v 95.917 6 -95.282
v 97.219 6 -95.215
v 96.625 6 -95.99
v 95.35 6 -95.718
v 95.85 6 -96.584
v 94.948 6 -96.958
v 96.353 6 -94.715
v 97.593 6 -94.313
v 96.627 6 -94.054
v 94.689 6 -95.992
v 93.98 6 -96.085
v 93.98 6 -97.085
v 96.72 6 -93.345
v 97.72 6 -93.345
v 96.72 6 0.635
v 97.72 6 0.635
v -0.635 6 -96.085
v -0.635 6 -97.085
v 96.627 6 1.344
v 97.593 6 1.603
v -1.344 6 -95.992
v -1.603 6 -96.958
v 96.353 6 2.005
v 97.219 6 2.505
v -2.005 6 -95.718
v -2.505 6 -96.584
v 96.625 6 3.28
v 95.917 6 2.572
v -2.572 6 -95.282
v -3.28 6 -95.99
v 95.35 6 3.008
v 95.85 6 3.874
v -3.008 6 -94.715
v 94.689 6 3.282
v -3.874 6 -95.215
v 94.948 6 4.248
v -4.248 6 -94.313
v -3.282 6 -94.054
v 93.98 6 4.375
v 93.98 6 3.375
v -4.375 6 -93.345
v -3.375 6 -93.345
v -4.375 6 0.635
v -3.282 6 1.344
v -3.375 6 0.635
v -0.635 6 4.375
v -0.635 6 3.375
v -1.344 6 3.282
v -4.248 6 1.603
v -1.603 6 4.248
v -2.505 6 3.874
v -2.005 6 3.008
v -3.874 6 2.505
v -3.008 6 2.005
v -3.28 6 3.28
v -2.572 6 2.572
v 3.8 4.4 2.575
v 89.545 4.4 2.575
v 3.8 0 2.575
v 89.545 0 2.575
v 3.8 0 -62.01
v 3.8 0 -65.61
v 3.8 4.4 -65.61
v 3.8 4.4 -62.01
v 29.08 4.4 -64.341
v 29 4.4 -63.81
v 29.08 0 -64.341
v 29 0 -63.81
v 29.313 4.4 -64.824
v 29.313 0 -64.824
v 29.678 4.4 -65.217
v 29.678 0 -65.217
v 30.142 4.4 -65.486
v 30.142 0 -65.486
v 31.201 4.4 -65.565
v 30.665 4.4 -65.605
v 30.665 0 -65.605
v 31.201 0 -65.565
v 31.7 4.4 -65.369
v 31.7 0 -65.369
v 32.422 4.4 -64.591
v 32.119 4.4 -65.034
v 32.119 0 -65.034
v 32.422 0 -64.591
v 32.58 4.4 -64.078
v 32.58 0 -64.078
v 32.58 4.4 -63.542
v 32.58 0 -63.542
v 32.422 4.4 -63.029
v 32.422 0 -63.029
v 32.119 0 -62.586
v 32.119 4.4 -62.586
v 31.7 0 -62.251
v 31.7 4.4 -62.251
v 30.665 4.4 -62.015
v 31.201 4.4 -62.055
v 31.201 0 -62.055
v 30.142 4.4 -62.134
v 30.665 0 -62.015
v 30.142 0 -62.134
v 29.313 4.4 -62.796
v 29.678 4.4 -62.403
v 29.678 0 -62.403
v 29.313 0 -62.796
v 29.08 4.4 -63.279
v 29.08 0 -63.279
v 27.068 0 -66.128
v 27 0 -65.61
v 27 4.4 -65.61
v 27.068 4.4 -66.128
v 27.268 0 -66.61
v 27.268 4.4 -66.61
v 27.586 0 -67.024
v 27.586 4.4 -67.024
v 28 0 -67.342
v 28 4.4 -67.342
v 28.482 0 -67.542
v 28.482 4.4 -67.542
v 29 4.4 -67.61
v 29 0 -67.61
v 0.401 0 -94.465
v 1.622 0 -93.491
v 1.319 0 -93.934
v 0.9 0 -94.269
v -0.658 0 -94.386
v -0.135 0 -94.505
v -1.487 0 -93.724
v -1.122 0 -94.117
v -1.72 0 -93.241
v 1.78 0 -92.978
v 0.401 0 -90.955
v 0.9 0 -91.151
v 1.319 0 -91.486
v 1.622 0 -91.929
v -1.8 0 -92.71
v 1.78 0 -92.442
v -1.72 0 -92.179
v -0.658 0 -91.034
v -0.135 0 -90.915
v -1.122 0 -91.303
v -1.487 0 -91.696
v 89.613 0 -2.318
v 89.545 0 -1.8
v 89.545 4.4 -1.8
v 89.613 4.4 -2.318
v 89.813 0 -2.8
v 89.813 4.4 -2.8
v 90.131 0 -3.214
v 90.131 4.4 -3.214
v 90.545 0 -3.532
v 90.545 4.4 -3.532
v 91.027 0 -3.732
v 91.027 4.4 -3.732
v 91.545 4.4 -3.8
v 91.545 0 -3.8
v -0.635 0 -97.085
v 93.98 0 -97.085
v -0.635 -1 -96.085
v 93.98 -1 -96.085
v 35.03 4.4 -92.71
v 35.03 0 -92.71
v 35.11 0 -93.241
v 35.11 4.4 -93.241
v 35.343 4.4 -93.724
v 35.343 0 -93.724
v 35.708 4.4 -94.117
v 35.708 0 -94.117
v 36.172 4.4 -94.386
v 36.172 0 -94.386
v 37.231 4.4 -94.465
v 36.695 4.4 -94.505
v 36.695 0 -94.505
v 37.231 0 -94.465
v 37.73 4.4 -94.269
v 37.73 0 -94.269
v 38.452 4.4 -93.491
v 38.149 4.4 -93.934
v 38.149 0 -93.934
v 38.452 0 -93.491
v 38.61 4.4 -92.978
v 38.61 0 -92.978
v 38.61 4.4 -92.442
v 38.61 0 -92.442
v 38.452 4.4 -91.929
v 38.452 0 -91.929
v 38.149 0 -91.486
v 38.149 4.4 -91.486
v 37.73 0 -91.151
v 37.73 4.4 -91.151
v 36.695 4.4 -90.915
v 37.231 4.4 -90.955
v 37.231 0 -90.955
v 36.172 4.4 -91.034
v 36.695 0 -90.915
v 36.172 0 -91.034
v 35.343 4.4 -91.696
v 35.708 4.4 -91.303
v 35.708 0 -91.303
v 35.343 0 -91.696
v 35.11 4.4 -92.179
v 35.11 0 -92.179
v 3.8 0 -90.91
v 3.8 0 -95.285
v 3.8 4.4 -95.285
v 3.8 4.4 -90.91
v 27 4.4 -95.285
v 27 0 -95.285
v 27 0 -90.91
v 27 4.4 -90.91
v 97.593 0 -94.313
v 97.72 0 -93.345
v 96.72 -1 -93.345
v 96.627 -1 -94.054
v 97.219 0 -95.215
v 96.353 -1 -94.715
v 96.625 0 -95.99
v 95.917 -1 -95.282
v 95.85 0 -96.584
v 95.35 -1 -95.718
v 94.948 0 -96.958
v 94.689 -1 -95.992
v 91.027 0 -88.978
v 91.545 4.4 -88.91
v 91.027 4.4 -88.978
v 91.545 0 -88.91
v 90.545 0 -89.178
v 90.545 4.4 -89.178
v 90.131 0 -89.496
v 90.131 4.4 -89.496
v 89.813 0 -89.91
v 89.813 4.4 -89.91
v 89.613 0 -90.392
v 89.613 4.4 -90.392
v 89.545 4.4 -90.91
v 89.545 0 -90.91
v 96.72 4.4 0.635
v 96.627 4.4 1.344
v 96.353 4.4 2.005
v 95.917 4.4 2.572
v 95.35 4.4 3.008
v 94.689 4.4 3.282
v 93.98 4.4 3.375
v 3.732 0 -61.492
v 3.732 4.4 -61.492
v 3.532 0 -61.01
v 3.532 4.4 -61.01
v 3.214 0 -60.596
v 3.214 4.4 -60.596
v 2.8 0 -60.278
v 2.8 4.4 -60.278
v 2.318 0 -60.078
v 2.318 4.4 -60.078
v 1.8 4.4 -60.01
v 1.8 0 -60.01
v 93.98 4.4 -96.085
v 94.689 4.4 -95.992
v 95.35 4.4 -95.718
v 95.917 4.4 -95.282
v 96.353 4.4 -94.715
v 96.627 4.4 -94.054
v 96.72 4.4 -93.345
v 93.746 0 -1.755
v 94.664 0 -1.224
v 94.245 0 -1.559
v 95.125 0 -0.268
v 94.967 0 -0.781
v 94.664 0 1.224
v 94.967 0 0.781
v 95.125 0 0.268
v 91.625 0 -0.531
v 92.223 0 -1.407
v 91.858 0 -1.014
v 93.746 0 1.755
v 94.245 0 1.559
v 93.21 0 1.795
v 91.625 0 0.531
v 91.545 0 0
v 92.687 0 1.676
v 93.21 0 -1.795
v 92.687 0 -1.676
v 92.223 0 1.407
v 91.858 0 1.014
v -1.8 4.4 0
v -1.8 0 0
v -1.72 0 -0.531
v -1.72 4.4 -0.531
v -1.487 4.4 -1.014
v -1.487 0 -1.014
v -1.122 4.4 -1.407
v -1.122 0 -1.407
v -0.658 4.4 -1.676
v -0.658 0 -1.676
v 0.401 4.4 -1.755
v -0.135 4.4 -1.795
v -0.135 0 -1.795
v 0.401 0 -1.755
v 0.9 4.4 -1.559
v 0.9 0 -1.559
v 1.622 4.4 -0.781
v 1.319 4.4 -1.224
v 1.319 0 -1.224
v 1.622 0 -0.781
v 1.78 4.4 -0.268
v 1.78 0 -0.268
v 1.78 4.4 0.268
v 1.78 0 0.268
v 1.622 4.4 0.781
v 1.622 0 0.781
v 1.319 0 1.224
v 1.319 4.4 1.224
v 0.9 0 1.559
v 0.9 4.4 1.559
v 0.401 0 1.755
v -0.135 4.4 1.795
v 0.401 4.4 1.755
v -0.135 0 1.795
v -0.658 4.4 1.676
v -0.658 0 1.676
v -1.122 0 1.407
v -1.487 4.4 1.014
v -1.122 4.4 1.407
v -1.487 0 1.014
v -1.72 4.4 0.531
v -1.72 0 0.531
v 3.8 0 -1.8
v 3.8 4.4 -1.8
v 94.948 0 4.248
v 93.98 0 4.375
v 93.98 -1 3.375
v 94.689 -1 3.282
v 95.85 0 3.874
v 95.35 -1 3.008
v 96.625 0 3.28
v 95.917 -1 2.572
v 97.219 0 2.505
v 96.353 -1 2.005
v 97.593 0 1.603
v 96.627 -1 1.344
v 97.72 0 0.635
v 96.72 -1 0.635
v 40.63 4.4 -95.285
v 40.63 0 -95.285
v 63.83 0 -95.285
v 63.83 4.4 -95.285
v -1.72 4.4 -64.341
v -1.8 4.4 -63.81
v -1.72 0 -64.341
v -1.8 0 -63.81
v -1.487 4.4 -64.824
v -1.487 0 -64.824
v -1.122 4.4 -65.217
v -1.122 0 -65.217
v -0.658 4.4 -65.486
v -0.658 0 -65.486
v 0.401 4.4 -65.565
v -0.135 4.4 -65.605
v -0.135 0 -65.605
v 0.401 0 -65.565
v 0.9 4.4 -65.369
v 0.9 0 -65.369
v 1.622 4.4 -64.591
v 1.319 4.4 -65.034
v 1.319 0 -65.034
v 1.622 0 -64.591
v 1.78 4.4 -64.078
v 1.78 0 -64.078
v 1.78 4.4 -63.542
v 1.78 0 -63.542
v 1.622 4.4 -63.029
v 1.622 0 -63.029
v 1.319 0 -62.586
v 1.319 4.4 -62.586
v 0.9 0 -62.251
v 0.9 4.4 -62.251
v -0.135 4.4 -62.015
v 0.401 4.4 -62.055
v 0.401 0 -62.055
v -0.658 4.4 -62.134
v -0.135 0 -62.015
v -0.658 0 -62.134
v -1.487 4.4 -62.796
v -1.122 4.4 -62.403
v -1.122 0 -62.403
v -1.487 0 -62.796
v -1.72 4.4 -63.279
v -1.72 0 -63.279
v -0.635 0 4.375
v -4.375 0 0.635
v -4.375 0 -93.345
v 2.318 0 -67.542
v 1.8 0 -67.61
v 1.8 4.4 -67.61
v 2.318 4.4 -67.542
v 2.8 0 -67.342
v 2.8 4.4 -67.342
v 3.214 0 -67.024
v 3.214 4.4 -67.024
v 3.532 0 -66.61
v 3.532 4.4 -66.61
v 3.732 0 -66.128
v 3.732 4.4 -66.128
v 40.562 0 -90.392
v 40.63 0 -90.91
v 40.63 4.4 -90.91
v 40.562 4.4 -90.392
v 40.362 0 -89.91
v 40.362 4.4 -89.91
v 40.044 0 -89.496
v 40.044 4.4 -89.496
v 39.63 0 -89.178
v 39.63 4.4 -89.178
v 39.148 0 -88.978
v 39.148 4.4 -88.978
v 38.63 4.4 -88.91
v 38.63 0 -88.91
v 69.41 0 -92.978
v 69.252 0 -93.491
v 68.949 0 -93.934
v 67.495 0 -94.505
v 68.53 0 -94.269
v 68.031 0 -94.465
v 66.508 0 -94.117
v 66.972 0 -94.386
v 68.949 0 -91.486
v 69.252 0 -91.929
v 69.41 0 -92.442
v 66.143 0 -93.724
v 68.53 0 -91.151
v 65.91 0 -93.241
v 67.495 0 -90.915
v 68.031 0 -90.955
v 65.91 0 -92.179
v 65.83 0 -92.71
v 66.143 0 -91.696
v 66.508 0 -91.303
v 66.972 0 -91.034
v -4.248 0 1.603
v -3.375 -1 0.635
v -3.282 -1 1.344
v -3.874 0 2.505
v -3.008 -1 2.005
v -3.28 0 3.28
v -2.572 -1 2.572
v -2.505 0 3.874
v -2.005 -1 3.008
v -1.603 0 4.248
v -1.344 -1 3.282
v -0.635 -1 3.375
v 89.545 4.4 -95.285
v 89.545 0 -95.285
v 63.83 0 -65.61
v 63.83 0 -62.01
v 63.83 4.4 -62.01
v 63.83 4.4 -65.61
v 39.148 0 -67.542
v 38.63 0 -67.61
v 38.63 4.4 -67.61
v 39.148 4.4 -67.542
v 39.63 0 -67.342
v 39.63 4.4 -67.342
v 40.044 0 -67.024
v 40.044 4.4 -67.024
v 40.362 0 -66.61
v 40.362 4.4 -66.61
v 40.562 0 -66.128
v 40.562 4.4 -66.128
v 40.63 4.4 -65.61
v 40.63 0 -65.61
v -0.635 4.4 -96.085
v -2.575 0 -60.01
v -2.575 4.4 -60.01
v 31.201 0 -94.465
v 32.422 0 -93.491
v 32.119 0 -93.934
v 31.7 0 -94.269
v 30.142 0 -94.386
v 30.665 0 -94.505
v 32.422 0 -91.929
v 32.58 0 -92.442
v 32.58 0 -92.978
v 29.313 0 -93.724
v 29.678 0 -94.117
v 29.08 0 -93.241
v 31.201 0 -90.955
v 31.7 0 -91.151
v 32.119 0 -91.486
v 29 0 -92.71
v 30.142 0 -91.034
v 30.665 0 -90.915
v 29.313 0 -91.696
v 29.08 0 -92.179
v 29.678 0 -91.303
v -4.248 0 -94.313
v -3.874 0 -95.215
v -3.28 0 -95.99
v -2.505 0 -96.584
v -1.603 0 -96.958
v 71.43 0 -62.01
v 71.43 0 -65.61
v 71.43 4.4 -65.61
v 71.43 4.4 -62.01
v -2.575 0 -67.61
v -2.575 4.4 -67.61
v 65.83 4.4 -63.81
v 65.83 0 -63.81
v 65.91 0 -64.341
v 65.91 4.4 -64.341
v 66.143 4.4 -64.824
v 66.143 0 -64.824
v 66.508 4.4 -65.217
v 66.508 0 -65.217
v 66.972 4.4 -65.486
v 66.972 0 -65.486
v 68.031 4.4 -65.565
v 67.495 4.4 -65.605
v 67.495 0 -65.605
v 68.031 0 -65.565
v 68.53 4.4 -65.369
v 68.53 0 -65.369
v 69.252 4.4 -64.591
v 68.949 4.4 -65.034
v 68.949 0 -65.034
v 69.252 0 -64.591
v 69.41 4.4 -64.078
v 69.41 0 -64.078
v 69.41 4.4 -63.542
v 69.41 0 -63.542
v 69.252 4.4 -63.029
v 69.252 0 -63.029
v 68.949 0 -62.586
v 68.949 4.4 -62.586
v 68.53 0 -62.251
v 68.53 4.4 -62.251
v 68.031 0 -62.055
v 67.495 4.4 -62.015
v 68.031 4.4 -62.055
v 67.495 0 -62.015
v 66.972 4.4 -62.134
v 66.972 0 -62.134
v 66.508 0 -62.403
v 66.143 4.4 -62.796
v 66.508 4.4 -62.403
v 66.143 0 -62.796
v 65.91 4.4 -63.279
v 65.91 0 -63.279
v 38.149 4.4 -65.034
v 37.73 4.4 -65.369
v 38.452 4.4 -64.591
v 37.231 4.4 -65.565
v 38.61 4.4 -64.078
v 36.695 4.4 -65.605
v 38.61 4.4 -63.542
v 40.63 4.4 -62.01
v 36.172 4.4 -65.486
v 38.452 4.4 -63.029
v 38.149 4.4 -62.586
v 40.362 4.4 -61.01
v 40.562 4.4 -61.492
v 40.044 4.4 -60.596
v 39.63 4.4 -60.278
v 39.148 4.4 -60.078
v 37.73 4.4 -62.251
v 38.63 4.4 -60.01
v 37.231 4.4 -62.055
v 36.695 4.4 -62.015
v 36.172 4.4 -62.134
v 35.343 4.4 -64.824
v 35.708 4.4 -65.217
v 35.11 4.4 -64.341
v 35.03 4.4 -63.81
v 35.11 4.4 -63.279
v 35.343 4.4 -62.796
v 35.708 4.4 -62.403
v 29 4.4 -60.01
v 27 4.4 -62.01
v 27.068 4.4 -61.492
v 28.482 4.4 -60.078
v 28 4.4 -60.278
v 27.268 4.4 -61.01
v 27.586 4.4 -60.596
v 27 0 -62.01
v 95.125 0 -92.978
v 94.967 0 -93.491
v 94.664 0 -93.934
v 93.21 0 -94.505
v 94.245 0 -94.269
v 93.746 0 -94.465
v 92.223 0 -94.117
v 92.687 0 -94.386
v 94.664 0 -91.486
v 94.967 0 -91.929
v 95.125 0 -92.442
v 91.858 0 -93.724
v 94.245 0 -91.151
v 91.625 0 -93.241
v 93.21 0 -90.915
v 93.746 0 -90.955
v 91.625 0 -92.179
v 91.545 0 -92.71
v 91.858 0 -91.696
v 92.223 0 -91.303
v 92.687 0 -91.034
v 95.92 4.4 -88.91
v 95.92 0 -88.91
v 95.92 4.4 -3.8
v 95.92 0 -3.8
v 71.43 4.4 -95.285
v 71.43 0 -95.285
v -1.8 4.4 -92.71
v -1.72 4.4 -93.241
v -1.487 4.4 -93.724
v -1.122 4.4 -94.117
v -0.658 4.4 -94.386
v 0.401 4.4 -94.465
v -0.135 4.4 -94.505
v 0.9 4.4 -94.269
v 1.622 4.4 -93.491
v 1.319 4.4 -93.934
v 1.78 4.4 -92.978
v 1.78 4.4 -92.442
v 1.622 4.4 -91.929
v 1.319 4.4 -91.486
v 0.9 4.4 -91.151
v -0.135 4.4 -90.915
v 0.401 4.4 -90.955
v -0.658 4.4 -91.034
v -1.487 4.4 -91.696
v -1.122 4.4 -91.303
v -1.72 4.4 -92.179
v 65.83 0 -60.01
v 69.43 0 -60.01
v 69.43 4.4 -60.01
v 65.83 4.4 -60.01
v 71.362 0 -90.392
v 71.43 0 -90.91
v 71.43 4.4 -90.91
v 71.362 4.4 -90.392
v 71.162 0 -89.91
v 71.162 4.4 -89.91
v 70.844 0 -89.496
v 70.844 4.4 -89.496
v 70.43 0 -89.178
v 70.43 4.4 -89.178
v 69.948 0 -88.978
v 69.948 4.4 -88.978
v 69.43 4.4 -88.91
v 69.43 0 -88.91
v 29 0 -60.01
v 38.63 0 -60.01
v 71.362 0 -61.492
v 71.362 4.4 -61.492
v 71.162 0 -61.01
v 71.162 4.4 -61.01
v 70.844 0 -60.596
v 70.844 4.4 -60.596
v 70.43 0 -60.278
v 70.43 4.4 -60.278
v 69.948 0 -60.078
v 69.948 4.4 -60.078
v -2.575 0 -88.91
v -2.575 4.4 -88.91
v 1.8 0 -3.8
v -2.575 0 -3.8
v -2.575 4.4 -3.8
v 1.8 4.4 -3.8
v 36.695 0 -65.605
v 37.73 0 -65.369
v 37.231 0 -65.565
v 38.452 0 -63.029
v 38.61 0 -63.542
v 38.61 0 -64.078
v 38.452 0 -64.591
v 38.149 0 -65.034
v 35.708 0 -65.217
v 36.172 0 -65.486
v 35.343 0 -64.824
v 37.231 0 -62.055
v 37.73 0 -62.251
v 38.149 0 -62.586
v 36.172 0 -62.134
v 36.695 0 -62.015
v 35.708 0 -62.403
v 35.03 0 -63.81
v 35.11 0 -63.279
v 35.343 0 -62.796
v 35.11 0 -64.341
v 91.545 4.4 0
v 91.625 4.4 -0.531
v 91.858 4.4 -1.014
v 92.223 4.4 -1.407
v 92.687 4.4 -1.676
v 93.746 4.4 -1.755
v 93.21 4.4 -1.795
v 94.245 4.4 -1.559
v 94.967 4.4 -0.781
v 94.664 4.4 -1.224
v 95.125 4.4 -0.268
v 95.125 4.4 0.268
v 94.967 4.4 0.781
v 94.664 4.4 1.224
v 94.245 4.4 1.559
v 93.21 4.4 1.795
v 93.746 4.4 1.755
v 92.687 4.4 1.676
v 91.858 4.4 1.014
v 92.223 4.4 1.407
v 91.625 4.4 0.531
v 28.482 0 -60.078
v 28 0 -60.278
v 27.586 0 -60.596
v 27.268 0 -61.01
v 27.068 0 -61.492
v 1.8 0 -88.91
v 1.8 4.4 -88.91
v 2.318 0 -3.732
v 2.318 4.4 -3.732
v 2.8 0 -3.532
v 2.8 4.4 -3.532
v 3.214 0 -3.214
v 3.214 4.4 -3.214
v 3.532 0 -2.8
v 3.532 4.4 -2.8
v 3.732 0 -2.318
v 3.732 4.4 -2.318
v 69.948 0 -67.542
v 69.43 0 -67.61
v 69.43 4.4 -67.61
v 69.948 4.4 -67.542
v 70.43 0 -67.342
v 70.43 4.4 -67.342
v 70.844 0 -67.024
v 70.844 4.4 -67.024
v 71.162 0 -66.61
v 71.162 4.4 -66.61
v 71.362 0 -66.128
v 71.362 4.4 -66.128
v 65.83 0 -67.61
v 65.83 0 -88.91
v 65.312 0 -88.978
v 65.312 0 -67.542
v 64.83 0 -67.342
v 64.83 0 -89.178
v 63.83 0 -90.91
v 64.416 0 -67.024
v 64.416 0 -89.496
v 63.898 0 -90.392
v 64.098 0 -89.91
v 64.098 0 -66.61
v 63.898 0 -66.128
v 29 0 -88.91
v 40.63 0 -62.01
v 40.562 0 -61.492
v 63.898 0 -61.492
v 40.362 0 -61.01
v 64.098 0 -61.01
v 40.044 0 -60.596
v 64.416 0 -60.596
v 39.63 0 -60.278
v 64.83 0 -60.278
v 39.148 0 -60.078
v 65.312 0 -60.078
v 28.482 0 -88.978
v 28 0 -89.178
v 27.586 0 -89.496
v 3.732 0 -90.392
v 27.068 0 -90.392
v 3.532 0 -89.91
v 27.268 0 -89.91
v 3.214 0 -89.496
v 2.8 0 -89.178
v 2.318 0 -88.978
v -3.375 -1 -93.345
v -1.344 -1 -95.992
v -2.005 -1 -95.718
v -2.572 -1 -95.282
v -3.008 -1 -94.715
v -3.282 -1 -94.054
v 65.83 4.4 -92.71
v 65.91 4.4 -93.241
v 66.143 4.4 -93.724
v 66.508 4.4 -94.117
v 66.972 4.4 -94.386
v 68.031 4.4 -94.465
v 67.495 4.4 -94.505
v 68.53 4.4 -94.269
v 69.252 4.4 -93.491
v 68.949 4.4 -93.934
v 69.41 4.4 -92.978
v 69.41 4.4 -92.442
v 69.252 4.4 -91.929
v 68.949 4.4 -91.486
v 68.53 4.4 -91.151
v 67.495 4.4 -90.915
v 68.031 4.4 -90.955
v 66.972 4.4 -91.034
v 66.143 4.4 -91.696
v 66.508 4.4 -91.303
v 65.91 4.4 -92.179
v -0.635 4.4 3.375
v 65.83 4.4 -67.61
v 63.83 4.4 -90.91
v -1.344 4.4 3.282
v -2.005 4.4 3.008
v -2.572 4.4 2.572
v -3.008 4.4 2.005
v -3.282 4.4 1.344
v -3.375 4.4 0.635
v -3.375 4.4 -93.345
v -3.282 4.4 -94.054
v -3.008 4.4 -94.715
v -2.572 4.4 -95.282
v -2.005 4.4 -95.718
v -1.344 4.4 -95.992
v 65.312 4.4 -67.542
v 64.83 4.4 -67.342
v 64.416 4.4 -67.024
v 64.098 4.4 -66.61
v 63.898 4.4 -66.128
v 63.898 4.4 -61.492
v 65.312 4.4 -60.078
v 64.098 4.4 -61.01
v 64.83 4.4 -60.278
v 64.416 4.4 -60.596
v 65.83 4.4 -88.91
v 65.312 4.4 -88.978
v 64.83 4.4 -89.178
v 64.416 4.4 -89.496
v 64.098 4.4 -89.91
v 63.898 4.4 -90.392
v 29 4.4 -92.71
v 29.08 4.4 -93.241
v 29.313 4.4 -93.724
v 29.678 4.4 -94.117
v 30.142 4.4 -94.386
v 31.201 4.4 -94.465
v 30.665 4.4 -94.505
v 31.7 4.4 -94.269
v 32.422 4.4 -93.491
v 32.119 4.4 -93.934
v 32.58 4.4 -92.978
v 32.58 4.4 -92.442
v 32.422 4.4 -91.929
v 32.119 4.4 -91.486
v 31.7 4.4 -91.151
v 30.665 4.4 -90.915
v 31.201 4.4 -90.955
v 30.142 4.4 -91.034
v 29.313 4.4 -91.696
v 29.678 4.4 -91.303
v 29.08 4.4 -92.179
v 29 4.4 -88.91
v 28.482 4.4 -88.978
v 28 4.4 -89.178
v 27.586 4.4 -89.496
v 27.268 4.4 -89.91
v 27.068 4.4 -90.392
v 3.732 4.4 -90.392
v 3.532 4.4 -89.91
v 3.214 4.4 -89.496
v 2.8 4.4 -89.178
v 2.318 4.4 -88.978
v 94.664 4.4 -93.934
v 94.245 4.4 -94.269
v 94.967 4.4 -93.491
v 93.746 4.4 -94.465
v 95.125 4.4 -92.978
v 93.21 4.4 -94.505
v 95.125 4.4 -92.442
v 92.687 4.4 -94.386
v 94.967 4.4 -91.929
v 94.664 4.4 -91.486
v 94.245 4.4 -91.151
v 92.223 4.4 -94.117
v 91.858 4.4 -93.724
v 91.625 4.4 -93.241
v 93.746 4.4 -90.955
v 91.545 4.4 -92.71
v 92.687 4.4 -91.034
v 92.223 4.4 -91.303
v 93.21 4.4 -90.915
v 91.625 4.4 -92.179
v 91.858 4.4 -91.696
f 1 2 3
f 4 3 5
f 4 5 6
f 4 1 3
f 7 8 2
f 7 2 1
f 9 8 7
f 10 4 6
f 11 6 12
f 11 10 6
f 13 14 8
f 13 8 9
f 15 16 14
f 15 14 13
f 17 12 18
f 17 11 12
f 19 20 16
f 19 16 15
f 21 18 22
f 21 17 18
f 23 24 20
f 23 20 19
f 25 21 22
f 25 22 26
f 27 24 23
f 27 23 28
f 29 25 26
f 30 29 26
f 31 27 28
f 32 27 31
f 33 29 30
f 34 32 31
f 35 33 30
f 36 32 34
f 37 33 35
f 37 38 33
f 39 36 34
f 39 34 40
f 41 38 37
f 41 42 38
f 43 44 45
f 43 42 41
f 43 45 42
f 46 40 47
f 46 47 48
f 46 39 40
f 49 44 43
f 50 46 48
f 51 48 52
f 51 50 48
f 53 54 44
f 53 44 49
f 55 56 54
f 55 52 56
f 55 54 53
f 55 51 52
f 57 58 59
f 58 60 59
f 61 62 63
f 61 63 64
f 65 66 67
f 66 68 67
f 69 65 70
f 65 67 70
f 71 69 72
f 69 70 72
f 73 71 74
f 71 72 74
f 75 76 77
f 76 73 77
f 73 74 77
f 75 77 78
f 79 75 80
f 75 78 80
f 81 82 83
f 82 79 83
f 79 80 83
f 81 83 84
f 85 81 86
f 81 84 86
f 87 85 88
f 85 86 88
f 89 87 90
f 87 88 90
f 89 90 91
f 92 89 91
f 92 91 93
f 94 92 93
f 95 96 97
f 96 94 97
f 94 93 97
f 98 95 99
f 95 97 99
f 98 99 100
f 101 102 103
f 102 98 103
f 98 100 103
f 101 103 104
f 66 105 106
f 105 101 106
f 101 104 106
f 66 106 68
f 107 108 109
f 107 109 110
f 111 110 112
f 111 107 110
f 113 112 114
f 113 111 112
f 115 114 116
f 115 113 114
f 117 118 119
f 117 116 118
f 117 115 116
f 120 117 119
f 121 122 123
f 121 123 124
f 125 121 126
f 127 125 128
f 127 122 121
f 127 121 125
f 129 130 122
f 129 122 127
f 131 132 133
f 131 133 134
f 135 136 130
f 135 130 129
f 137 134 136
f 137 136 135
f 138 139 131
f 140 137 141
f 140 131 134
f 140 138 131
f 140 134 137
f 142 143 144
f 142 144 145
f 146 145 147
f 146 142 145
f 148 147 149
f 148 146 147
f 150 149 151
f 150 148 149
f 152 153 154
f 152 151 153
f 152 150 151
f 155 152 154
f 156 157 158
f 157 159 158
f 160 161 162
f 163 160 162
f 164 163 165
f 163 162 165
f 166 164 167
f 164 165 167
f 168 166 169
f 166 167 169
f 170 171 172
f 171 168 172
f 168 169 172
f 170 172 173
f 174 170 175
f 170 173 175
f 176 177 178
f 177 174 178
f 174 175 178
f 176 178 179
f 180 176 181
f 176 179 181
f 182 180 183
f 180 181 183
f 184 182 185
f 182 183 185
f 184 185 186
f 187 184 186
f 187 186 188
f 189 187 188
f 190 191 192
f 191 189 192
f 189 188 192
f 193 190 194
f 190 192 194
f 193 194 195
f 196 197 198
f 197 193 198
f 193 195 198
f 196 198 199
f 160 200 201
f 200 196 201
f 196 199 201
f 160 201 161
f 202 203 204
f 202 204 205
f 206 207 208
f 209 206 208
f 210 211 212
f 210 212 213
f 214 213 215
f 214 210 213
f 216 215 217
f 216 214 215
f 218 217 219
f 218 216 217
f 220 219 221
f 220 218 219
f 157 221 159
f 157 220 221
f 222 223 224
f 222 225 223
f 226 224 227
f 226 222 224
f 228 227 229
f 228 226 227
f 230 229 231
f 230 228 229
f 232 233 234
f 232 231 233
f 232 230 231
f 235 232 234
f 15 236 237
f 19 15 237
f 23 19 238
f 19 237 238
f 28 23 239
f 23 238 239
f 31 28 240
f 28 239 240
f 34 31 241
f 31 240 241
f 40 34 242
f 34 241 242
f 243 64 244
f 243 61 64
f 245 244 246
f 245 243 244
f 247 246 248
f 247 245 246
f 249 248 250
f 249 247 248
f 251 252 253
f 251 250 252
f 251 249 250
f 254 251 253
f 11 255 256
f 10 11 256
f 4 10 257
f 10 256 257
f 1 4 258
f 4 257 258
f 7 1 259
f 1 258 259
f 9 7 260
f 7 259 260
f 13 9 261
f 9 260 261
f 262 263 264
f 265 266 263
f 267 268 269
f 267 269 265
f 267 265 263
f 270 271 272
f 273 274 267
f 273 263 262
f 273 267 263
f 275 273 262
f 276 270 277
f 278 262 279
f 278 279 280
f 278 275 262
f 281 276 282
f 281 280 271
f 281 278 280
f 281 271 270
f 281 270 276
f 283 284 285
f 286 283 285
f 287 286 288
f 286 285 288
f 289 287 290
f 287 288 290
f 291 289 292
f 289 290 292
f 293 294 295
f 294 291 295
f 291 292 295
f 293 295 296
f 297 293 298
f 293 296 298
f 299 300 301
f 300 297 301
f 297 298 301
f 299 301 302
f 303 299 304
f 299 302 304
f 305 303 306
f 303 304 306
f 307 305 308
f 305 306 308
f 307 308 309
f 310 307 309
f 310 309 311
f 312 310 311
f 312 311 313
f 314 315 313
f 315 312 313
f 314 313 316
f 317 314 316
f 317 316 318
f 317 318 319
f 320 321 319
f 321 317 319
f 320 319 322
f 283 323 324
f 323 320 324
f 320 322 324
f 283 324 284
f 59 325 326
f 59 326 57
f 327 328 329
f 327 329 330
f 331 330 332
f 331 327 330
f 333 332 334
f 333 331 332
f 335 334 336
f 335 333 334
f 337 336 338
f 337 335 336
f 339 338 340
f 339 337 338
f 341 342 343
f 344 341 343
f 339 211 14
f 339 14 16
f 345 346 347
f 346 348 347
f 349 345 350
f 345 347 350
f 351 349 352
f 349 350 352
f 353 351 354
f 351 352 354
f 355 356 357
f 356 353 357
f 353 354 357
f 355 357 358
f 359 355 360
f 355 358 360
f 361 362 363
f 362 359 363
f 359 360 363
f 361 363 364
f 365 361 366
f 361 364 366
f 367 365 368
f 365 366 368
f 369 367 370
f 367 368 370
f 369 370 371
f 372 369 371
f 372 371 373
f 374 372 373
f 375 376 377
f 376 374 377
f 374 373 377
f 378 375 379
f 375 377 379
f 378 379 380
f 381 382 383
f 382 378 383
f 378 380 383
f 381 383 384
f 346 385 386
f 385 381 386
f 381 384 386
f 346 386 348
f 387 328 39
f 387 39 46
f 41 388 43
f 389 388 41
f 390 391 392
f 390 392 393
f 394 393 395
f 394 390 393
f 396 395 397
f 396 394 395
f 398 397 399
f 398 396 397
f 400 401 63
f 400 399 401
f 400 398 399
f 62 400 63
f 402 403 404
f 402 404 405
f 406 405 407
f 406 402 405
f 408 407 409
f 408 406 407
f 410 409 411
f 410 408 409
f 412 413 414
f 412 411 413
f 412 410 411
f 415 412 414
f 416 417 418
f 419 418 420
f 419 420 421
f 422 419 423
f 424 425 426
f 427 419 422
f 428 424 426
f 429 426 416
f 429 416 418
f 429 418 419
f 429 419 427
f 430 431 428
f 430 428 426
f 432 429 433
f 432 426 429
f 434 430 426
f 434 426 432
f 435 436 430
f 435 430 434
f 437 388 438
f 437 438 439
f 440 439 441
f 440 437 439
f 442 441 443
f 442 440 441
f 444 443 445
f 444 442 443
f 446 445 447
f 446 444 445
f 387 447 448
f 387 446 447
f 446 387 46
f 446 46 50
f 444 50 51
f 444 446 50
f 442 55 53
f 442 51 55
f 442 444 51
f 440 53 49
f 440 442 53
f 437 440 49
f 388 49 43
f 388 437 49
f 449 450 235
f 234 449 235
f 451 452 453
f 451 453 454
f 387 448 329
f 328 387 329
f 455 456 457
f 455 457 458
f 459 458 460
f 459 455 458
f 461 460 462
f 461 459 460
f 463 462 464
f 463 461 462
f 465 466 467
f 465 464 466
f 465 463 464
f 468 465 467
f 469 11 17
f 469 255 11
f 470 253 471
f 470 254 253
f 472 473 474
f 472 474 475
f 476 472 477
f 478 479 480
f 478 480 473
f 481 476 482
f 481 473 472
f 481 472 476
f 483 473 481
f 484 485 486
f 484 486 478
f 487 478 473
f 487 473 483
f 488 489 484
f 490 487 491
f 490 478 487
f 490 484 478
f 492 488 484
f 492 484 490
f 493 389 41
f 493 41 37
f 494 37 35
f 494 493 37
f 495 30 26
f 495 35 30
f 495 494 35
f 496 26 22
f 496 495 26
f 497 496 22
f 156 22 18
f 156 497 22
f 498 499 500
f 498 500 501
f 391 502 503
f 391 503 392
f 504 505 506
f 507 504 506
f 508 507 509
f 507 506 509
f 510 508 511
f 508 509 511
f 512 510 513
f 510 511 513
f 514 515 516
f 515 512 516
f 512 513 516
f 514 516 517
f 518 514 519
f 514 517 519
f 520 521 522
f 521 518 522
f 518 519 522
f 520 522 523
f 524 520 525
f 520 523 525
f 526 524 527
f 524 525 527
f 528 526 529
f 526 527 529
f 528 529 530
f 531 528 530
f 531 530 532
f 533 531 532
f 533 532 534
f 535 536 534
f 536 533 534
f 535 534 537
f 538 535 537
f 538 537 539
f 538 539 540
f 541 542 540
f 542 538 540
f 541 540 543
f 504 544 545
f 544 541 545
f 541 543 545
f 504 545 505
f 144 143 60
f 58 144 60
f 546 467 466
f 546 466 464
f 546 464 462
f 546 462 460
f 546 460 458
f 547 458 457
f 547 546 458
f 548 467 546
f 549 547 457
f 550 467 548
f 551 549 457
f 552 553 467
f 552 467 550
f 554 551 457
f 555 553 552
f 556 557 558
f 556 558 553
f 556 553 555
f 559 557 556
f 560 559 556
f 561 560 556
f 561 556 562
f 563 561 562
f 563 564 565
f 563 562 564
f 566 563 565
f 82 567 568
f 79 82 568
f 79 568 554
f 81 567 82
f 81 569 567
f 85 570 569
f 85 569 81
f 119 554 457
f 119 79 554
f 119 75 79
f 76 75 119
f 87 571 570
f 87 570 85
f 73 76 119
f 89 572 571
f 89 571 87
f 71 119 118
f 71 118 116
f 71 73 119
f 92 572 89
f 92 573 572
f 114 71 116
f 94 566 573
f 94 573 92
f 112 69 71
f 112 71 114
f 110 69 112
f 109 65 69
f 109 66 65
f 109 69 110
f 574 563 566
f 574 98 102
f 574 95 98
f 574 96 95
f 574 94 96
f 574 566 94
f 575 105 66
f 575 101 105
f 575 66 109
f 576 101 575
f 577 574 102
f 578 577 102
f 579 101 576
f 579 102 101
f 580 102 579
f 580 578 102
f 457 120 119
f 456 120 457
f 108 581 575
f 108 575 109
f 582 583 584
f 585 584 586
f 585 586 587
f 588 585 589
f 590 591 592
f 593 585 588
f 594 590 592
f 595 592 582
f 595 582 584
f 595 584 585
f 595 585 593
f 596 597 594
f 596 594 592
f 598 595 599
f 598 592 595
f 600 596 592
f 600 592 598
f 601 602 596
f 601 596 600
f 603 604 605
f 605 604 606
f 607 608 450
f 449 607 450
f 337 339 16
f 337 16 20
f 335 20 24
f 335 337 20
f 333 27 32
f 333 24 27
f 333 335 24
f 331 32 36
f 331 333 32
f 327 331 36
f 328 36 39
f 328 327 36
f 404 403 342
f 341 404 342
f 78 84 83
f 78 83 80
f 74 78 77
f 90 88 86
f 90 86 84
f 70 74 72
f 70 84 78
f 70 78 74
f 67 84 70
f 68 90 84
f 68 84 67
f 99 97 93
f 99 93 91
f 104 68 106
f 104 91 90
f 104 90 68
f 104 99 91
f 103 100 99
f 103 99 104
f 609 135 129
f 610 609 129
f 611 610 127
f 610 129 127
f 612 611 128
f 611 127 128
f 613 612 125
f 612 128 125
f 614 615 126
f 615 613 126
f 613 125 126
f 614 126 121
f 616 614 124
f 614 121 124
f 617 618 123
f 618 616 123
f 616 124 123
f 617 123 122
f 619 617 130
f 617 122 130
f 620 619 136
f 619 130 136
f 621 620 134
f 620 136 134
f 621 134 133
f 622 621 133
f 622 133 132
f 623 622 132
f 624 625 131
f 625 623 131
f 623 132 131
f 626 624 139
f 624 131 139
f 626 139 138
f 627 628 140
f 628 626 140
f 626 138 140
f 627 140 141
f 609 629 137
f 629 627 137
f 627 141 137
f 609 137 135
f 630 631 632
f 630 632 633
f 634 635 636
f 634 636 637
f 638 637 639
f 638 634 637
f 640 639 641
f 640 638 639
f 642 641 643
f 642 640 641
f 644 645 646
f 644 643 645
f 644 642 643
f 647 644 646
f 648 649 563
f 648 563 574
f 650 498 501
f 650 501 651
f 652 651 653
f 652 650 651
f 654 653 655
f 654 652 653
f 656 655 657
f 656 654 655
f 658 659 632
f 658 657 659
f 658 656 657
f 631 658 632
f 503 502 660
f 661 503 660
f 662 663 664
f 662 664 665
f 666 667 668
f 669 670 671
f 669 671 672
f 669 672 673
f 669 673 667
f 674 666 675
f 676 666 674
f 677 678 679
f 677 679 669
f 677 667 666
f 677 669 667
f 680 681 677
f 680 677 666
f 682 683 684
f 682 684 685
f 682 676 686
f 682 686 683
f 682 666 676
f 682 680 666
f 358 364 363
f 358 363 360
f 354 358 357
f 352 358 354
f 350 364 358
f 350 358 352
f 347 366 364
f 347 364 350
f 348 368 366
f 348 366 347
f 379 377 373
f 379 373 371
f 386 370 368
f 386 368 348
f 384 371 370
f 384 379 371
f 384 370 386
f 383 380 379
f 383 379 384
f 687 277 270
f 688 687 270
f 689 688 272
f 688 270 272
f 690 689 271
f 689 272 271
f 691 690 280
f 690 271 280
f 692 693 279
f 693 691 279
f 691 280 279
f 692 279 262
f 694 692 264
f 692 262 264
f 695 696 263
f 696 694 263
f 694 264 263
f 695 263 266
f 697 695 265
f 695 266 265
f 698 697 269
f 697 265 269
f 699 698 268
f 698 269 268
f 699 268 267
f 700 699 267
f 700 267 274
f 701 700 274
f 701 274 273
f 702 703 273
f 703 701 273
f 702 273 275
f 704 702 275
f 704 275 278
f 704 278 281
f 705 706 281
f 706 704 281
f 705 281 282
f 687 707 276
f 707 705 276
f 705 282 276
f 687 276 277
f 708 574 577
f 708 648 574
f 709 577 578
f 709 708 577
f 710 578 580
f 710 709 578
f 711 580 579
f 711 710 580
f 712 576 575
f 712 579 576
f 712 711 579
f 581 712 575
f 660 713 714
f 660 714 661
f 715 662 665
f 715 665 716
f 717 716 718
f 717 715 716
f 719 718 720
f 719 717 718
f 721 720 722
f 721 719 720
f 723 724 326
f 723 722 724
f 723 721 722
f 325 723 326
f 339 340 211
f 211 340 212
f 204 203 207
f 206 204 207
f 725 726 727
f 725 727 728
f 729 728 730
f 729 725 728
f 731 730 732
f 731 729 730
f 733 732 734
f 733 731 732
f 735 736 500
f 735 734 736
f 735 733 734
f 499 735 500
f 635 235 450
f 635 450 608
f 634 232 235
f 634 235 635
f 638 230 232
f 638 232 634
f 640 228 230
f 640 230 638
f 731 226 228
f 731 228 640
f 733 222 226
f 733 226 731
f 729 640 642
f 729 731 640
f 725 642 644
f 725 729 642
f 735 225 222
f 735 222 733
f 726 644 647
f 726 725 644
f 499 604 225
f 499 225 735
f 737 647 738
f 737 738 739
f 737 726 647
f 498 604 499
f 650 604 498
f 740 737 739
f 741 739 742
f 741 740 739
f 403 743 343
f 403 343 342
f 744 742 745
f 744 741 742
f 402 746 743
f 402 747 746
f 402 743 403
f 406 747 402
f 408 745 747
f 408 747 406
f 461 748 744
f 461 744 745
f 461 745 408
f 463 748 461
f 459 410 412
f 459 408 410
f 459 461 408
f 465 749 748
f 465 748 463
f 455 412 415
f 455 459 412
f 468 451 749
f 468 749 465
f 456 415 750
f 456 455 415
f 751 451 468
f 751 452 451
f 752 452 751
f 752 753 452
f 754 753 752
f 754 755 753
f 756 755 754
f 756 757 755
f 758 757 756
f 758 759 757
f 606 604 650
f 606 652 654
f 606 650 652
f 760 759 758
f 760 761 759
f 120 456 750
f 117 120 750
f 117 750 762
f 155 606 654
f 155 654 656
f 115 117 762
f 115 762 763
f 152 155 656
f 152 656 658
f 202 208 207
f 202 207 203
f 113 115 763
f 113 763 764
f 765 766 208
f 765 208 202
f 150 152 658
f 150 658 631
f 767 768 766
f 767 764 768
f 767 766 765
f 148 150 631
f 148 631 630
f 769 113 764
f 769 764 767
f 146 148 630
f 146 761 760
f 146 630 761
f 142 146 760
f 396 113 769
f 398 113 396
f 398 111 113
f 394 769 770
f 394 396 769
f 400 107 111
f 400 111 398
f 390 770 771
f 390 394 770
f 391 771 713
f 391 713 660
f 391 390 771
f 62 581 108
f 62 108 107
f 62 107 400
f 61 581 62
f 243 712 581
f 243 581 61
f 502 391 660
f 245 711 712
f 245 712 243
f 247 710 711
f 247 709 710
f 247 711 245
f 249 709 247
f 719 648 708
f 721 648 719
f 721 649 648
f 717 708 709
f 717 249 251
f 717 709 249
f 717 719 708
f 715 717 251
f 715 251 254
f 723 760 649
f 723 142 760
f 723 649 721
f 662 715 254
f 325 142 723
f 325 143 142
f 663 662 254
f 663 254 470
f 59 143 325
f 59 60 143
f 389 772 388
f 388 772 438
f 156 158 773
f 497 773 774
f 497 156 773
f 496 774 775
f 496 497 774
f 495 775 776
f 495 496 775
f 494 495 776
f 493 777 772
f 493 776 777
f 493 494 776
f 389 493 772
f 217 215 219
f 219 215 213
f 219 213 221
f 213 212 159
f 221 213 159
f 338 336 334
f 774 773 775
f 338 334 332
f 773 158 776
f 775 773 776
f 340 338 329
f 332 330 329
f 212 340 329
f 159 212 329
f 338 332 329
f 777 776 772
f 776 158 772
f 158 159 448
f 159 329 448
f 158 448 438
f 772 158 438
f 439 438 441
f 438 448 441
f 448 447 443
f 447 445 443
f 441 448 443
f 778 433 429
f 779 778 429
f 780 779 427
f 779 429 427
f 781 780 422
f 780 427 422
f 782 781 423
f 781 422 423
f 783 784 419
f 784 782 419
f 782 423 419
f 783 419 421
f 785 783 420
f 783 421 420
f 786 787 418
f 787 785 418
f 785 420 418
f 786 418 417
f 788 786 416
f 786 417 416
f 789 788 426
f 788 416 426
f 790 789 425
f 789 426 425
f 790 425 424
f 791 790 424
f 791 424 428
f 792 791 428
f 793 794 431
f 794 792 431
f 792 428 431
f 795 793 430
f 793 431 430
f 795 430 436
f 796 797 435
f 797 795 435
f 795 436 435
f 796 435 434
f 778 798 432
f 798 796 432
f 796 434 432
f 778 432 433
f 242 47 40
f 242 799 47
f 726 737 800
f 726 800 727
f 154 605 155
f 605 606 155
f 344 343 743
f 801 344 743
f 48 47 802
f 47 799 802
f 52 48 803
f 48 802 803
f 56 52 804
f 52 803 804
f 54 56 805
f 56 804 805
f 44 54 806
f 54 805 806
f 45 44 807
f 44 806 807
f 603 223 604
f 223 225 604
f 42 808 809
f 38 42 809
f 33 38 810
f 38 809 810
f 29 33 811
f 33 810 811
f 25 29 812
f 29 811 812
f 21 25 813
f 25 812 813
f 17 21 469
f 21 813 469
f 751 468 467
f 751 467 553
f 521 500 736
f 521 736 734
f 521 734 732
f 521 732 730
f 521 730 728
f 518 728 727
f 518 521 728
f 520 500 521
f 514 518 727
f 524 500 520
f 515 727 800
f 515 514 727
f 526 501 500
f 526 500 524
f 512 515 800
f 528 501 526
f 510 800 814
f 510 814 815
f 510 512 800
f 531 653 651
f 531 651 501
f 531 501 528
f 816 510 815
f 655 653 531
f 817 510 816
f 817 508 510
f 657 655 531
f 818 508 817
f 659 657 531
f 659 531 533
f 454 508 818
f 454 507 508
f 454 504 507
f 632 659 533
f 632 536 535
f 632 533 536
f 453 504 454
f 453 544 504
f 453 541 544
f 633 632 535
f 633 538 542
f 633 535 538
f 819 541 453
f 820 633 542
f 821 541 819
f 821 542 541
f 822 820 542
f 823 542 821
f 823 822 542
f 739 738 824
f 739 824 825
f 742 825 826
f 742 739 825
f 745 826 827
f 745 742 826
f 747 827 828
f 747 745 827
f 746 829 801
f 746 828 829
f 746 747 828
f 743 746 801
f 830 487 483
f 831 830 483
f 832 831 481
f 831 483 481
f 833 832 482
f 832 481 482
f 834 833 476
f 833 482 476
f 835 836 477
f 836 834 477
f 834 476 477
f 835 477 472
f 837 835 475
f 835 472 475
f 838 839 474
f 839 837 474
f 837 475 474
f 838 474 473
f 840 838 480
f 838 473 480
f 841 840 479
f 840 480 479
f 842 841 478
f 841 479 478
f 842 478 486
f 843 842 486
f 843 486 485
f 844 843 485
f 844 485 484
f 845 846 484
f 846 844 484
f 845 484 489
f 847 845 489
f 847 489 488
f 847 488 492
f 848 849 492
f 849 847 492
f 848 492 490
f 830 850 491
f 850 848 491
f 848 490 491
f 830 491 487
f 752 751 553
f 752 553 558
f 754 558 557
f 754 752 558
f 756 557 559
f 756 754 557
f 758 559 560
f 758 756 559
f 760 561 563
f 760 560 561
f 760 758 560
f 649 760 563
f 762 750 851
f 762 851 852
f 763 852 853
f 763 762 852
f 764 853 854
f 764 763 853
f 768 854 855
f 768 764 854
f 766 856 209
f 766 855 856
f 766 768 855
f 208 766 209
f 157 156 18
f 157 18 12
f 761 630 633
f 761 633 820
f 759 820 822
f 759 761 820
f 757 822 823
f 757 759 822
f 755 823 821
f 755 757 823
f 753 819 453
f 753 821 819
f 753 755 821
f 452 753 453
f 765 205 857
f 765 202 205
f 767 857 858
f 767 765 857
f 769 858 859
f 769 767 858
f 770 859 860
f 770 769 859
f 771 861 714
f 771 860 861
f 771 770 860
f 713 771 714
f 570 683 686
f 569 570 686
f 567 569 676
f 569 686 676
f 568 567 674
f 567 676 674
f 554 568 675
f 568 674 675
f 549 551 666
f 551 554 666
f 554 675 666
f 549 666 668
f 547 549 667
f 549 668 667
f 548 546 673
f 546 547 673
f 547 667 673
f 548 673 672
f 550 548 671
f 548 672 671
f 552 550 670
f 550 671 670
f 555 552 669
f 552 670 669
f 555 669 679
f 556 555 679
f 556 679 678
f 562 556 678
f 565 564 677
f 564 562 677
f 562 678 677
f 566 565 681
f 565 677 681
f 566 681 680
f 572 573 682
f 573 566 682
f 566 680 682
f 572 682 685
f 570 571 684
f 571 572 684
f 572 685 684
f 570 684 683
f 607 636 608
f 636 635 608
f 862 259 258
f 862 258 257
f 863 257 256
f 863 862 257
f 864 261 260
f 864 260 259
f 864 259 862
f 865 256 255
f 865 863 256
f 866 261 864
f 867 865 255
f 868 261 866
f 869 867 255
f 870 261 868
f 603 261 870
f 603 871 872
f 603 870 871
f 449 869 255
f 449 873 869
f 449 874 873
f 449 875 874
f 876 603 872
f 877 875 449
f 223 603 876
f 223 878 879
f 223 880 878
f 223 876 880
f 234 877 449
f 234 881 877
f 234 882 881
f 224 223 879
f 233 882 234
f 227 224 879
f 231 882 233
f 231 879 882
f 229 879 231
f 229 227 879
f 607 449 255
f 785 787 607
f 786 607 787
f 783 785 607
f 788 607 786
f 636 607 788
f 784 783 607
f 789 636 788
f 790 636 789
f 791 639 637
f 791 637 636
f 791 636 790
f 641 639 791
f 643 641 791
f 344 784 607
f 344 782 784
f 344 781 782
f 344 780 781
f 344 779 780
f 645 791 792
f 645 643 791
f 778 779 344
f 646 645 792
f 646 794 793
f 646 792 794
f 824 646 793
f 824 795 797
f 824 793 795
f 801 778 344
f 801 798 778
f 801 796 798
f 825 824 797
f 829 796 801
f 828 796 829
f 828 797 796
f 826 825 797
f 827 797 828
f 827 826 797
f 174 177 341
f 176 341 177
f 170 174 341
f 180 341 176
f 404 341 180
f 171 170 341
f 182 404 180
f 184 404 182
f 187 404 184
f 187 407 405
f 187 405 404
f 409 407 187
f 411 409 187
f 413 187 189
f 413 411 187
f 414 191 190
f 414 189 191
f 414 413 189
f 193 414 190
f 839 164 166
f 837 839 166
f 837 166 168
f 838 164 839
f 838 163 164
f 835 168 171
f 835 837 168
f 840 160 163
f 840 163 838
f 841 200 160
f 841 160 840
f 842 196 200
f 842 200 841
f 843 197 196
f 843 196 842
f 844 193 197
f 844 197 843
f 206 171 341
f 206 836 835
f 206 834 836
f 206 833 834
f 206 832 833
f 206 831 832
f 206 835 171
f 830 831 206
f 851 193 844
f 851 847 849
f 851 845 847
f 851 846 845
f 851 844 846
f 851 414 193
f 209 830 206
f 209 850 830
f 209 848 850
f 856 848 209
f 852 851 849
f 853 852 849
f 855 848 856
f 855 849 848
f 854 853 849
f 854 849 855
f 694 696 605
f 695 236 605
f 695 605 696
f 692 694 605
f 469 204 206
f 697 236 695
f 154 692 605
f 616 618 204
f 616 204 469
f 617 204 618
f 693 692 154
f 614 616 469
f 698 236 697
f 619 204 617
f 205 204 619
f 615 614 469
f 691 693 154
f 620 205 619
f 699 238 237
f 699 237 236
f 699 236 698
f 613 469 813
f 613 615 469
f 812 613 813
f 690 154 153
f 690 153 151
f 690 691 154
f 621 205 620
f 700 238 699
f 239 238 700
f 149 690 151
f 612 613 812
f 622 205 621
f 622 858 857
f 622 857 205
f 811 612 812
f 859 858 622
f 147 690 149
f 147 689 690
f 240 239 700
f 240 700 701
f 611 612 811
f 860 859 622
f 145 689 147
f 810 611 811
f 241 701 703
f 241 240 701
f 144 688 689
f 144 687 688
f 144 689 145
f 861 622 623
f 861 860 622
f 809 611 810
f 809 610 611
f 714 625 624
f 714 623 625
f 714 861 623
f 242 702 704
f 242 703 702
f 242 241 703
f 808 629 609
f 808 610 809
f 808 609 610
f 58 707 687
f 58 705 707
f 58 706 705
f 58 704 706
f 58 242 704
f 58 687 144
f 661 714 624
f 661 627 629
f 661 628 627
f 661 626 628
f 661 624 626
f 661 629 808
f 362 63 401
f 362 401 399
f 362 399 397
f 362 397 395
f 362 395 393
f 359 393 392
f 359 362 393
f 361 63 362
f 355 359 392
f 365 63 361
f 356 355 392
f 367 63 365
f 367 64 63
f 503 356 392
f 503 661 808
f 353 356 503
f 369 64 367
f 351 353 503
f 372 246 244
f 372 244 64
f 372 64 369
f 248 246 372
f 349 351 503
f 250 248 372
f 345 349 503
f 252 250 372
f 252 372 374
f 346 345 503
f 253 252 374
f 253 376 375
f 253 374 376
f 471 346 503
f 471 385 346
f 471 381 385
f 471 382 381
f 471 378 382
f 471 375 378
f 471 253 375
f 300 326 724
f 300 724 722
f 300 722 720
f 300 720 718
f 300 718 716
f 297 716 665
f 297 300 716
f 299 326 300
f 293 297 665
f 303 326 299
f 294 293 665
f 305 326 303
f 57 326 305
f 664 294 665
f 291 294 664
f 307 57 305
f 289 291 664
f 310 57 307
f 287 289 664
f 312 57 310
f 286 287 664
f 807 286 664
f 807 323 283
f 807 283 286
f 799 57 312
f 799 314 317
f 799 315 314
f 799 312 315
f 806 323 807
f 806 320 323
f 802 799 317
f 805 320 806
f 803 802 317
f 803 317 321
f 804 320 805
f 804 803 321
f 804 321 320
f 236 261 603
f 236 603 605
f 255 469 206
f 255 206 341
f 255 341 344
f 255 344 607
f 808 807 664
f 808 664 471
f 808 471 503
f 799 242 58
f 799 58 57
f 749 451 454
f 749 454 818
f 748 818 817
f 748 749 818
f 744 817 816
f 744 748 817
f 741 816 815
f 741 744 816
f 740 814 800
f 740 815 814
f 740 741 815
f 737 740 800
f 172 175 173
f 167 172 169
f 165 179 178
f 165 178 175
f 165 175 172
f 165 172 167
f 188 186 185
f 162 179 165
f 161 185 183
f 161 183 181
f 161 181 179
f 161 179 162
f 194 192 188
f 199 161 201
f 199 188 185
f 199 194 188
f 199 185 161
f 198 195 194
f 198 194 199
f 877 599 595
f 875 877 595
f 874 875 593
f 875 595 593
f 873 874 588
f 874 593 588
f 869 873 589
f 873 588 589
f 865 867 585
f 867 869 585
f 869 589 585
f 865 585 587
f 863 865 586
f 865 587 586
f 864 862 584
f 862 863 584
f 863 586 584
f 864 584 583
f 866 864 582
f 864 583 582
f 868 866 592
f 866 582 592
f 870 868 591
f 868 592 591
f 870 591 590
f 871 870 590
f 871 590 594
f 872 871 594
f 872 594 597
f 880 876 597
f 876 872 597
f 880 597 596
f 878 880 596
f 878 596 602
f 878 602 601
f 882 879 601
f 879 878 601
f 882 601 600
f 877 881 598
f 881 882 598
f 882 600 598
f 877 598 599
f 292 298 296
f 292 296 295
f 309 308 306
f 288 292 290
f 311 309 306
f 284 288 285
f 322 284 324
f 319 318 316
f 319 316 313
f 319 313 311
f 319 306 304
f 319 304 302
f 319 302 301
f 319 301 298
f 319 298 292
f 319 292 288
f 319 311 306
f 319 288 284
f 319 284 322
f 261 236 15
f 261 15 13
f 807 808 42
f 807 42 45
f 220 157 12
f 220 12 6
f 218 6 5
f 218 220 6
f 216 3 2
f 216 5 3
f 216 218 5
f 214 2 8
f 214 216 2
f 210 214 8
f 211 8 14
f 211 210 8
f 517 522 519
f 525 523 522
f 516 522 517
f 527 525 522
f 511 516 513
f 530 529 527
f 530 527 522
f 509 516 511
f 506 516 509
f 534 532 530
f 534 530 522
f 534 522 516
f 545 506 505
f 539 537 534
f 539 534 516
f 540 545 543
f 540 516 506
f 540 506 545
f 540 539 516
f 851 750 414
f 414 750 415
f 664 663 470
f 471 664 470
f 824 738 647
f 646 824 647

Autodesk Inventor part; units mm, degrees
ref_plane "YZ Plane" through (0, 0, 0) normal (1, 0, 0) x (0, 1, 0)
ref_plane "XZ Plane" through (0, 0, 0) normal (0, 1, 0) x (-1, 0, 0)
ref_plane "XY Plane" through (0, 0, 0) normal (0, 0, 1) x (1, 0, 0)
sketch "Skizze1" plane through (0, 0, 0) normal (0, 1, 0) x (-1, 0, 0)
  circle A0 centre (0, 0) radius 1.8
  line L0 (0, 0) -> (-93.345, 0) construction
  line L1 (-93.345, 0) -> (-93.345, -92.71) construction
  line L2 (-93.345, -92.71) -> (0, -92.71) construction
  line L3 (0, -92.71) -> (0, 0) construction
  circle A1 centre (0, -92.71) radius 1.8
  circle A2 centre (-93.345, -92.71) radius 1.8
  circle A3 centre (-93.345, 0) radius 1.8
  circle A4 centre (-30.8, -92.71) radius 1.8
  circle A5 centre (-36.83, -92.71) radius 1.8
  circle A6 centre (-67.63, -92.71) radius 1.8
  line L4 (0, -63.81) -> (-93.345, -63.81) construction
  circle A7 centre (0, -63.81) radius 1.8
  circle A8 centre (-30.8, -63.81) radius 1.8
  circle A9 centre (-36.83, -63.81) radius 1.8
  circle A10 centre (-67.63, -63.81) radius 1.8
  line L5 (0.635, -95.885) -> (-93.98, -95.885) construction
  line L6 (-96.52, -93.345) -> (-96.52, 0.635) construction
  line L7 (-93.98, 3.175) -> (0.635, 3.175) construction
  line L8 (3.175, 0.635) -> (3.175, -93.345) construction
  arc A11 (0.635, -95.885) -> (3.175, -93.345) centre (0.635, -93.345) ccw construction
  arc A12 (-96.52, -93.345) -> (-93.98, -95.885) centre (-93.98, -93.345) ccw construction
  arc A13 (-93.98, 3.175) -> (-96.52, 0.635) centre (-93.98, 0.635) ccw construction
  arc A14 (3.175, 0.635) -> (0.635, 3.175) centre (0.635, 0.635) ccw construction
  line L9 (-93.98, -96.085) -> (0.635, -96.085)
  arc A15 (0.635, -96.085) -> (3.375, -93.345) centre (0.635, -93.345) ccw
  line L10 (3.375, -93.345) -> (3.375, 0.635)
  arc A16 (3.375, 0.635) -> (0.635, 3.375) centre (0.635, 0.635) ccw
  line L11 (0.635, 3.375) -> (-93.98, 3.375)
  arc A17 (-93.98, 3.375) -> (-96.72, 0.635) centre (-93.98, 0.635) ccw
  line L12 (-96.72, 0.635) -> (-96.72, -93.345)
  arc A18 (-96.72, -93.345) -> (-93.98, -96.085) centre (-93.98, -93.345) ccw
  line L13 (0.635, -97.085) -> (-93.98, -97.085)
  arc A19 (-97.72, -93.345) -> (-93.98, -97.085) centre (-93.98, -93.345) ccw
  line L14 (-97.72, -93.345) -> (-97.72, 0.635)
  arc A20 (-93.98, 4.375) -> (-97.72, 0.635) centre (-93.98, 0.635) ccw
  line L15 (-93.98, 4.375) -> (0.635, 4.375)
  arc A21 (4.375, 0.635) -> (0.635, 4.375) centre (0.635, 0.635) ccw
  line L16 (4.375, 0.635) -> (4.375, -93.345)
  arc A22 (0.635, -97.085) -> (4.375, -93.345) centre (0.635, -93.345) ccw
  line L17 (0.635, -95.285) -> (-93.98, -95.285)
  arc A23 (-95.92, -93.345) -> (-93.98, -95.285) centre (-93.98, -93.345) ccw
  line L18 (-95.92, -93.345) -> (-95.92, 0.635)
  arc A24 (-93.98, 2.575) -> (-95.92, 0.635) centre (-93.98, 0.635) ccw
  line L19 (-93.98, 2.575) -> (0.635, 2.575)
  arc A25 (2.575, 0.635) -> (0.635, 2.575) centre (0.635, 0.635) ccw
  line L20 (2.575, 0.635) -> (2.575, -93.345)
  arc A26 (0.635, -95.285) -> (2.575, -93.345) centre (0.635, -93.345) ccw
  line L21 (-3.8, -95.285) -> (-3.8, -90.91)
  line L22 (-1.8, -88.91) -> (2.575, -88.91)
  line L23 (-27, -95.285) -> (-27, -90.91)
  line L24 (-29, -88.91) -> (-38.63, -88.91)
  line L25 (-40.63, -90.91) -> (-40.63, -95.285)
  line L26 (-63.83, -95.285) -> (-63.83, -90.91)
  line L27 (-65.83, -88.91) -> (-69.43, -88.91)
  line L28 (-71.43, -90.91) -> (-71.43, -95.285)
  line L29 (-89.545, -95.285) -> (-89.545, -90.91)
  line L30 (-91.545, -88.91) -> (-95.92, -88.91)
  line L31 (-95.92, -3.8) -> (-91.545, -3.8)
  line L32 (-89.545, -1.8) -> (-89.545, 2.575)
  line L33 (2.575, -3.8) -> (-1.8, -3.8)
  line L34 (-3.8, -1.8) -> (-3.8, 2.575)
  line L35 (2.575, -67.61) -> (-1.8, -67.61)
  line L36 (-3.8, -65.61) -> (-3.8, -62.01)
  line L37 (-1.8, -60.01) -> (2.575, -60.01)
  line L38 (-29, -67.61) -> (-38.63, -67.61)
  line L39 (-40.63, -65.61) -> (-40.63, -62.01)
  line L40 (-38.63, -60.01) -> (-29, -60.01)
  line L41 (-27, -62.01) -> (-27, -65.61)
  line L42 (-65.83, -67.61) -> (-69.43, -67.61)
  line L43 (-71.43, -65.61) -> (-71.43, -62.01)
  line L44 (-69.43, -60.01) -> (-65.83, -60.01)
  line L45 (-63.83, -62.01) -> (-63.83, -65.61)
  arc A27 (-1.8, -88.91) -> (-3.8, -90.91) centre (-1.8, -90.91) ccw
  arc A28 (-27, -90.91) -> (-29, -88.91) centre (-29, -90.91) ccw
  arc A29 (-38.63, -88.91) -> (-40.63, -90.91) centre (-38.63, -90.91) ccw
  arc A30 (-63.83, -90.91) -> (-65.83, -88.91) centre (-65.83, -90.91) ccw
  arc A31 (-69.43, -88.91) -> (-71.43, -90.91) centre (-69.43, -90.91) ccw
  arc A32 (-89.545, -90.91) -> (-91.545, -88.91) centre (-91.545, -90.91) ccw
  arc A33 (-65.83, -67.61) -> (-63.83, -65.61) centre (-65.83, -65.61) ccw
  arc A34 (-71.43, -65.61) -> (-69.43, -67.61) centre (-69.43, -65.61) ccw
  arc A35 (-69.43, -60.01) -> (-71.43, -62.01) centre (-69.43, -62.01) ccw
  arc A36 (-63.83, -62.01) -> (-65.83, -60.01) centre (-65.83, -62.01) ccw
  arc A37 (-27, -62.01) -> (-29, -60.01) centre (-29, -62.01) ccw
  arc A38 (-29, -67.61) -> (-27, -65.61) centre (-29, -65.61) ccw
  arc A39 (-40.63, -65.61) -> (-38.63, -67.61) centre (-38.63, -65.61) ccw
  arc A40 (-38.63, -60.01) -> (-40.63, -62.01) centre (-38.63, -62.01) ccw
  arc A41 (-1.8, -60.01) -> (-3.8, -62.01) centre (-1.8, -62.01) ccw
  arc A42 (-3.8, -65.61) -> (-1.8, -67.61) centre (-1.8, -65.61) ccw
  arc A43 (-3.8, -1.8) -> (-1.8, -3.8) centre (-1.8, -1.8) ccw
  arc A44 (-91.545, -3.8) -> (-89.545, -1.8) centre (-91.545, -1.8) ccw
  point P0 (-27, -67.61)
  point P1 (-40.63, -60.01)
  point P2 (-27, -60.01)
  dimension "d0" = 3.6
  dimension "d1" = 3.6
  dimension "d2" = 3.6
  dimension "d3" = 3.6
  dimension "d4" = 93.345
  dimension "d5" = 92.71
  dimension "d6" = 3.6
  dimension "d7" = 3.6
  dimension "d8" = 3.6
  dimension "d10" = 3.6
  dimension "d11" = 3.6
  dimension "d12" = 3.6
  dimension "d13" = 3.6
  dimension "d14" = 28.9
  dimension "d15" = 30.8
  dimension "d16" = 6.03
  dimension "d17" = 30.8
  dimension "d18" = 30.8
  dimension "d19" = 6.03
  dimension "d20" = 30.8
  dimension "d21" = 3.175
  dimension "d22" = 2.54
  dimension "d23" = 0.2
  dimension "d24" = 1
  dimension "d29" = 0.8
  dimension "d32" = 3.8
  dimension "d33" = 3.8
  dimension "d35" = 3.8
  dimension "d36" = 3.8
  dimension "d37" = 3.8
  dimension "d38" = 3.8
  dimension "d39" = 3.8
  dimension "d40" = 3.8
  dimension "d41" = 3.8
  dimension "d42" = 3.8
  dimension "d43" = 3.8
  dimension "d44" = 3.8
  dimension "d45" = 2
extrude "Extrusion1" add sketch "Skizze1" against normal blind 1 contours A0 | A1 | A2 | A3 | A4 | A5 | A6 | A7 | A8 | A9 | A10 | A18 L12 A17 L11 A16 L10 A15 L9 | L13 A19 L14 A20 L15 A21 L16 A22 | L17 L21 A27 L22 L20 A26 | L17 L23 A28 L24 A29 L25 L26 A30 L27 A31 L28 L29 A32 L30 L18 L31 A44 L32 L19 L34 A43 L33 L20 L37 A41 L36 A42 L35 L22 A27 L21 | L17 L25 A29 L24 A28 L23 | L35 A42 L36 A41 L37 L20 | L17 L28 A31 L27 A30 L26 | L33 A43 L34 L19 A25 L20 | L17 A23 L18 L30 A32 L29 | L32 A44 L31 L18 A24 L19 | L38 A39 L39 A40 L40 A37 L41 A38 | L42 A34 L43 A35 L44 A36 L45 A33
extrude "Extrusion2" add sketch "Skizze1" along normal blind 6 contours L13 A19 L14 A20 L15 A21 L16 A22
extrude "Extrusion3" add sketch "Skizze1" along normal blind 4.4 contours A18 L12 A17 L11 A16 L10 A15 L9
extrude "Extrusion4" add sketch "Skizze1" along normal up to surface (4.4 mm away) contours L17 L21 A27 L22 L20 A26 | L17 L25 A29 L24 A28 L23 | L35 A42 L36 A41 L37 L20 | L17 L28 A31 L27 A30 L26 | L33 A43 L34 L19 A25 L20 | L17 A23 L18 L30 A32 L29 | L32 A44 L31 L18 A24 L19 | L38 A39 L39 A40 L40 A37 L41 A38 | L42 A34 L43 A35 L44 A36 L45 A33
chamfer "Fase1" distance 1 angle 45 8 edges at (97.72, -1, -46.355) (96.6246, -1, 3.2796) (46.6725, -1, 4.375) (-3.2796, -1, 3.2796) (-4.375, -1, -46.355) (-3.2796, -1, -95.9896) (46.6725, -1, -97.085) (96.6246, -1, -95.9896)
equation "\"d0\" = holeDim"
equation "\"d1\" = holeDim"
equation "\"d2\" = holeDim"
equation "\"d3\" = holeDim"
equation "\"d6\" = holeDim"
equation "\"d7\" = holeDim"
equation "\"d8\" = holeDim"
equation "\"d10\" = holeDim"
equation "\"d11\" = holeDim"
equation "\"d12\" = holeDim"
equation "\"d13\" = holeDim"
equation "\"d17\" = d15"
equation "\"d18\" = d15"
equation "\"d19\" = d16"
equation "\"d20\" = d15"
equation "\"d23\" = airGabWall"
equation "\"d24\" = topWallThick"
equation "\"d29\" = baseWallThick"
equation "\"d32\" = insertWallThick"
equation "\"d33\" = insertWallThick"
equation "\"d35\" = insertWallThick"
equation "\"d36\" = insertWallThick"
equation "\"d37\" = insertWallThick"
equation "\"d38\" = insertWallThick"
equation "\"d39\" = insertWallThick"
equation "\"d40\" = insertWallThick"
equation "\"d41\" = insertWallThick"
equation "\"d42\" = insertWallThick"
equation "\"d43\" = insertWallThick"
equation "\"d44\" = insertWallThick"
equation "\"d25\" = baseThick"
equation "\"d27\" = heightWall"
equation "\"d30\" = baseHeightWall"
equation "\"holeDim\" = 3.6"
equation "\"topWallThick\" = 1"
equation "\"airGabWall\" = 0.2"
equation "\"baseThick\" = 1"
equation "\"heightWall\" = heightInnerWall + pcbThick"
equation "\"baseWallThick\" = 0.8"
equation "\"pcbThick\" = 1.6"
equation "\"baseHeightWall\" = heightWall - pcbThick"
equation "\"heightInnerWall\" = 4.4"
equation "\"insertWallThick\" = 3.8"
properties part number "Housing_Bottom"
